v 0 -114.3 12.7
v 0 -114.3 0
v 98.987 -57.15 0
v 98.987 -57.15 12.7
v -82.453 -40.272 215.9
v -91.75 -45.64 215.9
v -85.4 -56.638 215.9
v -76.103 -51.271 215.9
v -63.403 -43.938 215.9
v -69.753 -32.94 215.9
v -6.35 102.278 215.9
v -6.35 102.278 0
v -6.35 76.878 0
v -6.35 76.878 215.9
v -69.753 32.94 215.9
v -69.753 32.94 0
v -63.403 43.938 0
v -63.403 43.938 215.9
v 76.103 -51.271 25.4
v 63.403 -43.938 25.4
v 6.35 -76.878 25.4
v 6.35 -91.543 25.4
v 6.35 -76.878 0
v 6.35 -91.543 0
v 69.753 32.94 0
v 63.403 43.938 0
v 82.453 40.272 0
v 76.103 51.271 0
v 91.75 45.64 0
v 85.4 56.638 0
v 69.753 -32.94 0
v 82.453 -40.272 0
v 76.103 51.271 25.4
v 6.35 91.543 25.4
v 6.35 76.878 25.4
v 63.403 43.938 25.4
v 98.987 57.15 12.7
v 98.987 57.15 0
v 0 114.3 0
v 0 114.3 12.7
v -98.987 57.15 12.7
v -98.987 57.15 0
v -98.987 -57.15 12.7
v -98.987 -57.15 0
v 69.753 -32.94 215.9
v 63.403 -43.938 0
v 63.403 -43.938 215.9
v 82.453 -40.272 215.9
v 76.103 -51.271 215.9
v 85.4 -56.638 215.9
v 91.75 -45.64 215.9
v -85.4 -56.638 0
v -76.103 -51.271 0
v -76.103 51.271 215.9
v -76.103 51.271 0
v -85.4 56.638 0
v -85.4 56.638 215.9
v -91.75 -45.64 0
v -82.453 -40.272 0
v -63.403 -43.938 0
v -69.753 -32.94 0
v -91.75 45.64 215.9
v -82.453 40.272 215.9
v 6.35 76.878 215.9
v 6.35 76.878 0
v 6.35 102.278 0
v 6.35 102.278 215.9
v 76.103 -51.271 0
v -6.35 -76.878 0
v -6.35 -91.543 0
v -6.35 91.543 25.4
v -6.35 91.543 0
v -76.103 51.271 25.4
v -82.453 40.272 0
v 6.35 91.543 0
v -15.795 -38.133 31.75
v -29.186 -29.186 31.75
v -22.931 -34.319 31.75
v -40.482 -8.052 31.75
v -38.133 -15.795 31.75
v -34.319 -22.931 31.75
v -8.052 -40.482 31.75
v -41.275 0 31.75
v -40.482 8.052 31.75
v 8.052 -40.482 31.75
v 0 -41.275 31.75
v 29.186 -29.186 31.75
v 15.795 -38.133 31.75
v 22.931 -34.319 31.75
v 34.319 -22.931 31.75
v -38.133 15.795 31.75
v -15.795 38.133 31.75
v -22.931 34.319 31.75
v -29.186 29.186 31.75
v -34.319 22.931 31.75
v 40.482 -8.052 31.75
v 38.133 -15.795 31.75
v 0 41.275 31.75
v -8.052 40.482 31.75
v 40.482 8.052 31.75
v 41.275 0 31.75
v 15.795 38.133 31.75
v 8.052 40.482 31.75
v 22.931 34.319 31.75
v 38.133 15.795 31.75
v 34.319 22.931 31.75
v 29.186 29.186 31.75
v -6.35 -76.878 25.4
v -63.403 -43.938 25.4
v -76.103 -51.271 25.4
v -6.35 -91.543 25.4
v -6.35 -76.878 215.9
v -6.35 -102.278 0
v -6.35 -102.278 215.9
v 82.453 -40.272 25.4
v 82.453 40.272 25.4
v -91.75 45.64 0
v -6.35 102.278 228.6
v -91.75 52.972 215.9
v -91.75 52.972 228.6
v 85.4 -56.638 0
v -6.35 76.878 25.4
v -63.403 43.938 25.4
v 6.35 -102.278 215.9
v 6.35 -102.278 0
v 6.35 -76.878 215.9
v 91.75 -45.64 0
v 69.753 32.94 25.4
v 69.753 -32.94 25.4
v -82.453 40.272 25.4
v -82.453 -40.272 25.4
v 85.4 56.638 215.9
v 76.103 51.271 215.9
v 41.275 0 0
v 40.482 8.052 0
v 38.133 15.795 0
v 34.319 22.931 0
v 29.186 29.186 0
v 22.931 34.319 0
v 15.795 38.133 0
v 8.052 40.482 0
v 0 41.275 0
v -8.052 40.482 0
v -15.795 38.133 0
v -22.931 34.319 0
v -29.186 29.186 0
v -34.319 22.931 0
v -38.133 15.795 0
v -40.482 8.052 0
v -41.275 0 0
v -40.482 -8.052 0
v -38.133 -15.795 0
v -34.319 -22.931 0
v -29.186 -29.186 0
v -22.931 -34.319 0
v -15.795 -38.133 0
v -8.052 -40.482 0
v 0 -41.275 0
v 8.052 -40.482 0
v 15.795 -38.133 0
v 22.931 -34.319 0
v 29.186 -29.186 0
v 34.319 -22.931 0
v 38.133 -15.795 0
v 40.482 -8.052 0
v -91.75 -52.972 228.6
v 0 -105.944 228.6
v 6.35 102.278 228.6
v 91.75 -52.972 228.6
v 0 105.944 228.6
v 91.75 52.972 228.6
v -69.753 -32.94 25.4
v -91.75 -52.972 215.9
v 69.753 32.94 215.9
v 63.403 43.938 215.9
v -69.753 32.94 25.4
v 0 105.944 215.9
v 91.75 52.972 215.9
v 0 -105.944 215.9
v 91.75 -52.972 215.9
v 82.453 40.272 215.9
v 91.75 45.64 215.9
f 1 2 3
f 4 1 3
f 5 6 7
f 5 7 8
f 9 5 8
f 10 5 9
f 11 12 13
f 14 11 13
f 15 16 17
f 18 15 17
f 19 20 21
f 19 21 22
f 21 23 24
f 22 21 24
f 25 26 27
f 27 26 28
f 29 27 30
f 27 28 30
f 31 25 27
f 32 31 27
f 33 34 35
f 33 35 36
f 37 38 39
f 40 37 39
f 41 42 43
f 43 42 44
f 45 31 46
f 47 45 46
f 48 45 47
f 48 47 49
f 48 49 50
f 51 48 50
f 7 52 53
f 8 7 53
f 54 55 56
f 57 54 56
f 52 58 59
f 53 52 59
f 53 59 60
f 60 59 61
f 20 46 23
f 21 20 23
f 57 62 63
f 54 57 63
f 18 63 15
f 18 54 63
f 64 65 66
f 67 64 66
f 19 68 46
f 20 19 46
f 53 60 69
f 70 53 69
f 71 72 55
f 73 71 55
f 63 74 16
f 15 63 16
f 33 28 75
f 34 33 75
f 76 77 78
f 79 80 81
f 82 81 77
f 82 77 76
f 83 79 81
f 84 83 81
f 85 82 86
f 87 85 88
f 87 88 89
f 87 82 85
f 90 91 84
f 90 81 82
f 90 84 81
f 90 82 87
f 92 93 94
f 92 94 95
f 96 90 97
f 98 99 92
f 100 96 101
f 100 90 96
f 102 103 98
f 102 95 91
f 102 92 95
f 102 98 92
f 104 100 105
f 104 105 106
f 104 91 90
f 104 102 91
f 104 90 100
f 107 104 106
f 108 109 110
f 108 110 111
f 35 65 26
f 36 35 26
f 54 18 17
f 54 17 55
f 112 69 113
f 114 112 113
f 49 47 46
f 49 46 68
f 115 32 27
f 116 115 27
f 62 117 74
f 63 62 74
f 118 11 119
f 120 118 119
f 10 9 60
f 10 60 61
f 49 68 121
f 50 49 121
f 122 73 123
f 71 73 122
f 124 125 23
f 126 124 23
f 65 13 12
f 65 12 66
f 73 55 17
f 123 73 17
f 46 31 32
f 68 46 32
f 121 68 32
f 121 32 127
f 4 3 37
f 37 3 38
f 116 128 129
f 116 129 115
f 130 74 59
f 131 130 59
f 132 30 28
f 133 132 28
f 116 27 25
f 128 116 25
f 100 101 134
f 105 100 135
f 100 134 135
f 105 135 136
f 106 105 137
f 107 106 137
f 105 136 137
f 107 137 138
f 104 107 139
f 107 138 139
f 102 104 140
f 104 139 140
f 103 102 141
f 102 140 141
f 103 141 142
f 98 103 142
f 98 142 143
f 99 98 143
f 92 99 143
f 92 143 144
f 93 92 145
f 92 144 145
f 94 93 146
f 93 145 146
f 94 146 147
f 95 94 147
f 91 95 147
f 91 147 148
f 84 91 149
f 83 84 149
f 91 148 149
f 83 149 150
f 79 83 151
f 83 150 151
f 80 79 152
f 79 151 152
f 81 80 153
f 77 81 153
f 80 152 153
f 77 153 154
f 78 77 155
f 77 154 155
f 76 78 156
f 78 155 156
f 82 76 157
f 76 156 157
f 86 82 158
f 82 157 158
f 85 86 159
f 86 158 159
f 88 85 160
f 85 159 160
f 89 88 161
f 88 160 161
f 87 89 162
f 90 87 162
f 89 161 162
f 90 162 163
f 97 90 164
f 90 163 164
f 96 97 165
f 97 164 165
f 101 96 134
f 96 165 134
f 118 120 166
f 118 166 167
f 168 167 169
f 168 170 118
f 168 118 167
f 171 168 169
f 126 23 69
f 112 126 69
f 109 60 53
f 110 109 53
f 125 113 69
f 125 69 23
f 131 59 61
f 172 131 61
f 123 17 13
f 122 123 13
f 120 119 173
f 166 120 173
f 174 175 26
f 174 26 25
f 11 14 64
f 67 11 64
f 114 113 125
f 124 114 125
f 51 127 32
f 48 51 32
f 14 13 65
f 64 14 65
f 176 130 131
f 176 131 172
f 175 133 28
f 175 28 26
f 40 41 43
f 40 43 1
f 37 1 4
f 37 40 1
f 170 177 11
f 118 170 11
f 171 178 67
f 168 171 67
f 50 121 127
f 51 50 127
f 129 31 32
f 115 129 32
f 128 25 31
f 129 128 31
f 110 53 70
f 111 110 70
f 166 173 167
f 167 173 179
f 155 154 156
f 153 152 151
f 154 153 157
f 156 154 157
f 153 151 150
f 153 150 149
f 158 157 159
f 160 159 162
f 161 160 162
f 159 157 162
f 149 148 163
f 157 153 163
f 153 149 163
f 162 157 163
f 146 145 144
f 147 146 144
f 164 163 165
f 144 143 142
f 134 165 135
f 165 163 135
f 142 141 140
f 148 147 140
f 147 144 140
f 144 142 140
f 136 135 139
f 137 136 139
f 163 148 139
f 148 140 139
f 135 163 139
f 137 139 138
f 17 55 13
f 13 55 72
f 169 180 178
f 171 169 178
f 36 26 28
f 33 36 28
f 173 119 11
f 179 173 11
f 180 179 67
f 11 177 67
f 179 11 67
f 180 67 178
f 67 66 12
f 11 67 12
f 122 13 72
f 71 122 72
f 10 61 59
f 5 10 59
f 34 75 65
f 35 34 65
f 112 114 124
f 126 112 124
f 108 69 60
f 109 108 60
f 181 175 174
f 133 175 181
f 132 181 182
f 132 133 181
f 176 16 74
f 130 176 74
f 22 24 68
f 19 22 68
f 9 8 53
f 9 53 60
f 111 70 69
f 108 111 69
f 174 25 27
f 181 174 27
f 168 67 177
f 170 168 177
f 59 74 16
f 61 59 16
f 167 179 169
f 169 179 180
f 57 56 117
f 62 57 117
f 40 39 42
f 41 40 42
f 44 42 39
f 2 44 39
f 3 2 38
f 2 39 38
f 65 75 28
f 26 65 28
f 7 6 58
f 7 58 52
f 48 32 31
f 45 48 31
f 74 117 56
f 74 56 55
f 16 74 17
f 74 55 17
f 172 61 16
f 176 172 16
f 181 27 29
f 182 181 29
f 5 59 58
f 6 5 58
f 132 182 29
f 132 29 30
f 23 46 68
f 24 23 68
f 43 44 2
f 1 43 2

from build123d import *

# Parameters (mm, degrees)
F0_R     = 41.275
F1_DEPTH = 12.7
F2_DEPTH = 25.4
F3_DEPTH = 215.9
F4_DEPTH = 31.75
F5_W     = 12.7
F5_H     = 25.4
F6_DEPTH = 12.7


with BuildPart() as f1:
    # F0 (on Top) → F1 (new body)
    with BuildSketch(Plane.XY):
        Polygon((98.9867036526, -57.15), (98.9867036526, 57.15), (0, 114.3), (-98.9867036526, 57.15), (-98.9867036526, -57.15), (0, -114.3), align=None)
        Polygon((91.7501829945, 45.6396444314), (82.4531377384, 40.2719928501), (82.4531377384, -40.2719928501), (91.7501829945, -45.6396444314), (85.4001829945, -56.6381670594), (76.1031377384, -51.2705154782), (6.35, -91.5425083282), (6.35, -102.2778114908), (-6.35, -102.2778114908), (-6.35, -91.5425083282), (-76.1031377384, -51.2705154782), (-85.4001829945, -56.6381670594), (-91.7501829945, -45.6396444314), (-82.4531377384, -40.2719928501), (-82.4531377384, 40.2719928501), (-91.7501829945, 45.6396444314), (-85.4001829945, 56.6381670594), (-76.1031377384, 51.2705154782), (-6.35, 91.5425083282), (-6.35, 102.2778114908), (6.35, 102.2778114908), (6.35, 91.5425083282), (76.1031377384, 51.2705154782), (85.4001829945, 56.6381670594), align=None, mode=Mode.SUBTRACT)
        Polygon((69.7531377384, -32.9396444314), (69.7531377384, 32.9396444314), (63.4031377384, 43.9381670594), (6.35, 76.8778114908), (-6.35, 76.8778114908), (-63.4031377384, 43.9381670594), (-69.7531377384, 32.9396444314), (-69.7531377384, -32.9396444314), (-63.4031377384, -43.9381670594), (-6.35, -76.8778114908), (6.35, -76.8778114908), (63.4031377384, -43.9381670594), align=None)
        Circle(F0_R, mode=Mode.SUBTRACT)
        Circle(F0_R)
        Polygon((63.4031377384, 43.9381670594), (76.1031377384, 51.2705154782), (6.35, 91.5425083282), (6.35, 76.8778114908), align=None)
        Polygon((6.35, -91.5425083282), (76.1031377384, -51.2705154782), (63.4031377384, -43.9381670594), (6.35, -76.8778114908), align=None)
        Polygon((82.4531377384, -40.2719928501), (82.4531377384, 40.2719928501), (69.7531377384, 32.9396444314), (69.7531377384, -32.9396444314), align=None)
        Polygon((-6.35, 76.8778114908), (-6.35, 91.5425083282), (-76.1031377384, 51.2705154782), (-63.4031377384, 43.9381670594), align=None)
        Polygon((-69.7531377384, -32.9396444314), (-69.7531377384, 32.9396444314), (-82.4531377384, 40.2719928501), (-82.4531377384, -40.2719928501), align=None)
        Polygon((-6.35, -91.5425083282), (-6.35, -76.8778114908), (-63.4031377384, -43.9381670594), (-76.1031377384, -51.2705154782), align=None)
        Polygon((82.4531377384, 40.2719928501), (82.4531377384, 47.6043412688), (76.1031377384, 51.2705154782), (63.4031377384, 43.9381670594), (69.7531377384, 40.2719928501), (69.7531377384, 32.9396444314), align=None)
        Polygon((0, -95.2086825376), (6.35, -91.5425083282), (6.35, -76.8778114908), (0, -80.5439857002), (-6.35, -76.8778114908), (-6.35, -91.5425083282), align=None)
        Polygon((82.4531377384, -47.6043412688), (82.4531377384, -40.2719928501), (69.7531377384, -32.9396444314), (69.7531377384, -40.2719928501), (63.4031377384, -43.9381670594), (76.1031377384, -51.2705154782), align=None)
        Polygon((6.35, 76.8778114908), (6.35, 91.5425083282), (0, 95.2086825376), (-6.35, 91.5425083282), (-6.35, 76.8778114908), (0, 80.5439857002), align=None)
        Polygon((-63.4031377384, 43.9381670594), (-76.1031377384, 51.2705154782), (-82.4531377384, 47.6043412688), (-82.4531377384, 40.2719928501), (-69.7531377384, 32.9396444314), (-69.7531377384, 40.2719928501), align=None)
        Polygon((-76.1031377384, -51.2705154782), (-63.4031377384, -43.9381670594), (-69.7531377384, -40.2719928501), (-69.7531377384, -32.9396444314), (-82.4531377384, -40.2719928501), (-82.4531377384, -47.6043412688), align=None)
        Polygon((76.1031377384, 51.2705154782), (82.4531377384, 47.6043412688), (82.4531377384, 40.2719928501), (91.7501829945, 45.6396444314), (85.4001829945, 56.6381670594), align=None)
        Polygon((91.7501829945, -45.6396444314), (82.4531377384, -40.2719928501), (82.4531377384, -47.6043412688), (76.1031377384, -51.2705154782), (85.4001829945, -56.6381670594), align=None)
        Polygon((6.35, -102.2778114908), (6.35, -91.5425083282), (0, -95.2086825376), (-6.35, -91.5425083282), (-6.35, -102.2778114908), align=None)
        Polygon((0, 95.2086825376), (6.35, 91.5425083282), (6.35, 102.2778114908), (-6.35, 102.2778114908), (-6.35, 91.5425083282), align=None)
        Polygon((-82.4531377384, 47.6043412688), (-76.1031377384, 51.2705154782), (-85.4001829945, 56.6381670594), (-91.7501829945, 45.6396444314), (-82.4531377384, 40.2719928501), align=None)
        Polygon((-85.4001829945, -56.6381670594), (-76.1031377384, -51.2705154782), (-82.4531377384, -47.6043412688), (-82.4531377384, -40.2719928501), (-91.7501829945, -45.6396444314), align=None)
        Polygon((0, -80.5439857002), (6.35, -76.8778114908), (-6.35, -76.8778114908), align=None)
        Polygon((-6.35, 76.8778114908), (6.35, 76.8778114908), (0, 80.5439857002), align=None)
        Polygon((69.7531377384, -40.2719928501), (69.7531377384, -32.9396444314), (63.4031377384, -43.9381670594), align=None)
        Polygon((-69.7531377384, 32.9396444314), (-63.4031377384, 43.9381670594), (-69.7531377384, 40.2719928501), align=None)
        Polygon((-69.7531377384, -40.2719928501), (-63.4031377384, -43.9381670594), (-69.7531377384, -32.9396444314), align=None)
        Polygon((63.4031377384, 43.9381670594), (69.7531377384, 32.9396444314), (69.7531377384, 40.2719928501), align=None)
    extrude(amount=F1_DEPTH)


with BuildPart() as f2:
    # F0 (on Top) → F2 (new body)
    with BuildSketch(Plane.XY):
        Polygon((-69.7531377384, -32.9396444314), (-69.7531377384, 32.9396444314), (-82.4531377384, 40.2719928501), (-82.4531377384, -40.2719928501), align=None)
    extrude(amount=F2_DEPTH)


with BuildPart() as f2b:
    # F0 (on Top) → F2, piece 2 (new body)
    with BuildSketch(Plane.XY):
        Polygon((-6.35, 76.8778114908), (-6.35, 91.5425083282), (-76.1031377384, 51.2705154782), (-63.4031377384, 43.9381670594), align=None)
    extrude(amount=F2_DEPTH)


with BuildPart() as f2c:
    # F0 (on Top) → F2, piece 3 (new body)
    with BuildSketch(Plane.XY):
        Polygon((63.4031377384, 43.9381670594), (76.1031377384, 51.2705154782), (6.35, 91.5425083282), (6.35, 76.8778114908), align=None)
    extrude(amount=F2_DEPTH)


with BuildPart() as f2d:
    # F0 (on Top) → F2, piece 4 (new body)
    with BuildSketch(Plane.XY):
        Polygon((82.4531377384, -40.2719928501), (82.4531377384, 40.2719928501), (69.7531377384, 32.9396444314), (69.7531377384, -32.9396444314), align=None)
    extrude(amount=F2_DEPTH)


with BuildPart() as f2e:
    # F0 (on Top) → F2, piece 5 (new body)
    with BuildSketch(Plane.XY):
        Polygon((6.35, -91.5425083282), (76.1031377384, -51.2705154782), (63.4031377384, -43.9381670594), (6.35, -76.8778114908), align=None)
    extrude(amount=F2_DEPTH)


with BuildPart() as f2f:
    # F0 (on Top) → F2, piece 6 (new body)
    with BuildSketch(Plane.XY):
        Polygon((-6.35, -91.5425083282), (-6.35, -76.8778114908), (-63.4031377384, -43.9381670594), (-76.1031377384, -51.2705154782), align=None)
    extrude(amount=F2_DEPTH)


with BuildPart() as f3:
    # F0 (on Top) → F3 (new body)
    with BuildSketch(Plane.XY):
        Polygon((-82.4531377384, 47.6043412688), (-76.1031377384, 51.2705154782), (-85.4001829945, 56.6381670594), (-91.7501829945, 45.6396444314), (-82.4531377384, 40.2719928501), align=None)
        Polygon((-63.4031377384, 43.9381670594), (-76.1031377384, 51.2705154782), (-82.4531377384, 47.6043412688), (-82.4531377384, 40.2719928501), (-69.7531377384, 32.9396444314), (-69.7531377384, 40.2719928501), align=None)
        Polygon((-69.7531377384, 32.9396444314), (-63.4031377384, 43.9381670594), (-69.7531377384, 40.2719928501), align=None)
    extrude(amount=F3_DEPTH)


with BuildPart() as f3b:
    # F0 (on Top) → F3, piece 2 (new body)
    with BuildSketch(Plane.XY):
        Polygon((-69.7531377384, -40.2719928501), (-63.4031377384, -43.9381670594), (-69.7531377384, -32.9396444314), align=None)
        Polygon((-76.1031377384, -51.2705154782), (-63.4031377384, -43.9381670594), (-69.7531377384, -40.2719928501), (-69.7531377384, -32.9396444314), (-82.4531377384, -40.2719928501), (-82.4531377384, -47.6043412688), align=None)
        Polygon((-85.4001829945, -56.6381670594), (-76.1031377384, -51.2705154782), (-82.4531377384, -47.6043412688), (-82.4531377384, -40.2719928501), (-91.7501829945, -45.6396444314), align=None)
    extrude(amount=F3_DEPTH)


with BuildPart() as f3c:
    # F0 (on Top) → F3, piece 3 (new body)
    with BuildSketch(Plane.XY):
        Polygon((0, 95.2086825376), (6.35, 91.5425083282), (6.35, 102.2778114908), (-6.35, 102.2778114908), (-6.35, 91.5425083282), align=None)
        Polygon((6.35, 76.8778114908), (6.35, 91.5425083282), (0, 95.2086825376), (-6.35, 91.5425083282), (-6.35, 76.8778114908), (0, 80.5439857002), align=None)
        Polygon((-6.35, 76.8778114908), (6.35, 76.8778114908), (0, 80.5439857002), align=None)
    extrude(amount=F3_DEPTH)


with BuildPart() as f3d:
    # F0 (on Top) → F3, piece 4 (new body)
    with BuildSketch(Plane.XY):
        Polygon((76.1031377384, 51.2705154782), (82.4531377384, 47.6043412688), (82.4531377384, 40.2719928501), (91.7501829945, 45.6396444314), (85.4001829945, 56.6381670594), align=None)
        Polygon((82.4531377384, 40.2719928501), (82.4531377384, 47.6043412688), (76.1031377384, 51.2705154782), (63.4031377384, 43.9381670594), (69.7531377384, 40.2719928501), (69.7531377384, 32.9396444314), align=None)
        Polygon((63.4031377384, 43.9381670594), (69.7531377384, 32.9396444314), (69.7531377384, 40.2719928501), align=None)
    extrude(amount=F3_DEPTH)


with BuildPart() as f3e:
    # F0 (on Top) → F3, piece 5 (new body)
    with BuildSketch(Plane.XY):
        Polygon((69.7531377384, -40.2719928501), (69.7531377384, -32.9396444314), (63.4031377384, -43.9381670594), align=None)
        Polygon((82.4531377384, -47.6043412688), (82.4531377384, -40.2719928501), (69.7531377384, -32.9396444314), (69.7531377384, -40.2719928501), (63.4031377384, -43.9381670594), (76.1031377384, -51.2705154782), align=None)
        Polygon((91.7501829945, -45.6396444314), (82.4531377384, -40.2719928501), (82.4531377384, -47.6043412688), (76.1031377384, -51.2705154782), (85.4001829945, -56.6381670594), align=None)
    extrude(amount=F3_DEPTH)


with BuildPart() as f3f:
    # F0 (on Top) → F3, piece 6 (new body)
    with BuildSketch(Plane.XY):
        Polygon((0, -80.5439857002), (6.35, -76.8778114908), (-6.35, -76.8778114908), align=None)
        Polygon((0, -95.2086825376), (6.35, -91.5425083282), (6.35, -76.8778114908), (0, -80.5439857002), (-6.35, -76.8778114908), (-6.35, -91.5425083282), align=None)
        Polygon((6.35, -102.2778114908), (6.35, -91.5425083282), (0, -95.2086825376), (-6.35, -91.5425083282), (-6.35, -102.2778114908), align=None)
    extrude(amount=F3_DEPTH)


with BuildPart() as f4:
    # F0 (on Top) → F4 (new body)
    with BuildSketch(Plane.XY):
        Circle(F0_R)
    extrude(amount=F4_DEPTH)


with BuildPart() as f6:
    # F5 (on face) → F6 (new body)
    with BuildSketch(Plane.XY.offset(215.9)):
        with Locations((0, 89.5778114908)):
            Rectangle(F5_W, F5_H)
        Polygon((91.7501829945, -52.9719928501), (91.7501829945, 52.9719928501), (6.35, 102.2778114908), (6.35, 76.8778114908), (-6.35, 76.8778114908), (-6.35, 102.2778114908), (-91.7501829945, 52.9719928501), (-91.7501829945, -52.9719928501), (0, -105.9439857002), align=None)
        Polygon((-6.35, 102.2778114908), (6.35, 102.2778114908), (0, 105.9439857002), align=None)
    extrude(amount=F6_DEPTH)


solid = Compound([f1.part, f2.part, f2b.part, f2c.part, f2d.part, f2e.part, f2f.part, f3.part, f3b.part, f3c.part, f3d.part, f3e.part, f3f.part, f4.part, f6.part])
